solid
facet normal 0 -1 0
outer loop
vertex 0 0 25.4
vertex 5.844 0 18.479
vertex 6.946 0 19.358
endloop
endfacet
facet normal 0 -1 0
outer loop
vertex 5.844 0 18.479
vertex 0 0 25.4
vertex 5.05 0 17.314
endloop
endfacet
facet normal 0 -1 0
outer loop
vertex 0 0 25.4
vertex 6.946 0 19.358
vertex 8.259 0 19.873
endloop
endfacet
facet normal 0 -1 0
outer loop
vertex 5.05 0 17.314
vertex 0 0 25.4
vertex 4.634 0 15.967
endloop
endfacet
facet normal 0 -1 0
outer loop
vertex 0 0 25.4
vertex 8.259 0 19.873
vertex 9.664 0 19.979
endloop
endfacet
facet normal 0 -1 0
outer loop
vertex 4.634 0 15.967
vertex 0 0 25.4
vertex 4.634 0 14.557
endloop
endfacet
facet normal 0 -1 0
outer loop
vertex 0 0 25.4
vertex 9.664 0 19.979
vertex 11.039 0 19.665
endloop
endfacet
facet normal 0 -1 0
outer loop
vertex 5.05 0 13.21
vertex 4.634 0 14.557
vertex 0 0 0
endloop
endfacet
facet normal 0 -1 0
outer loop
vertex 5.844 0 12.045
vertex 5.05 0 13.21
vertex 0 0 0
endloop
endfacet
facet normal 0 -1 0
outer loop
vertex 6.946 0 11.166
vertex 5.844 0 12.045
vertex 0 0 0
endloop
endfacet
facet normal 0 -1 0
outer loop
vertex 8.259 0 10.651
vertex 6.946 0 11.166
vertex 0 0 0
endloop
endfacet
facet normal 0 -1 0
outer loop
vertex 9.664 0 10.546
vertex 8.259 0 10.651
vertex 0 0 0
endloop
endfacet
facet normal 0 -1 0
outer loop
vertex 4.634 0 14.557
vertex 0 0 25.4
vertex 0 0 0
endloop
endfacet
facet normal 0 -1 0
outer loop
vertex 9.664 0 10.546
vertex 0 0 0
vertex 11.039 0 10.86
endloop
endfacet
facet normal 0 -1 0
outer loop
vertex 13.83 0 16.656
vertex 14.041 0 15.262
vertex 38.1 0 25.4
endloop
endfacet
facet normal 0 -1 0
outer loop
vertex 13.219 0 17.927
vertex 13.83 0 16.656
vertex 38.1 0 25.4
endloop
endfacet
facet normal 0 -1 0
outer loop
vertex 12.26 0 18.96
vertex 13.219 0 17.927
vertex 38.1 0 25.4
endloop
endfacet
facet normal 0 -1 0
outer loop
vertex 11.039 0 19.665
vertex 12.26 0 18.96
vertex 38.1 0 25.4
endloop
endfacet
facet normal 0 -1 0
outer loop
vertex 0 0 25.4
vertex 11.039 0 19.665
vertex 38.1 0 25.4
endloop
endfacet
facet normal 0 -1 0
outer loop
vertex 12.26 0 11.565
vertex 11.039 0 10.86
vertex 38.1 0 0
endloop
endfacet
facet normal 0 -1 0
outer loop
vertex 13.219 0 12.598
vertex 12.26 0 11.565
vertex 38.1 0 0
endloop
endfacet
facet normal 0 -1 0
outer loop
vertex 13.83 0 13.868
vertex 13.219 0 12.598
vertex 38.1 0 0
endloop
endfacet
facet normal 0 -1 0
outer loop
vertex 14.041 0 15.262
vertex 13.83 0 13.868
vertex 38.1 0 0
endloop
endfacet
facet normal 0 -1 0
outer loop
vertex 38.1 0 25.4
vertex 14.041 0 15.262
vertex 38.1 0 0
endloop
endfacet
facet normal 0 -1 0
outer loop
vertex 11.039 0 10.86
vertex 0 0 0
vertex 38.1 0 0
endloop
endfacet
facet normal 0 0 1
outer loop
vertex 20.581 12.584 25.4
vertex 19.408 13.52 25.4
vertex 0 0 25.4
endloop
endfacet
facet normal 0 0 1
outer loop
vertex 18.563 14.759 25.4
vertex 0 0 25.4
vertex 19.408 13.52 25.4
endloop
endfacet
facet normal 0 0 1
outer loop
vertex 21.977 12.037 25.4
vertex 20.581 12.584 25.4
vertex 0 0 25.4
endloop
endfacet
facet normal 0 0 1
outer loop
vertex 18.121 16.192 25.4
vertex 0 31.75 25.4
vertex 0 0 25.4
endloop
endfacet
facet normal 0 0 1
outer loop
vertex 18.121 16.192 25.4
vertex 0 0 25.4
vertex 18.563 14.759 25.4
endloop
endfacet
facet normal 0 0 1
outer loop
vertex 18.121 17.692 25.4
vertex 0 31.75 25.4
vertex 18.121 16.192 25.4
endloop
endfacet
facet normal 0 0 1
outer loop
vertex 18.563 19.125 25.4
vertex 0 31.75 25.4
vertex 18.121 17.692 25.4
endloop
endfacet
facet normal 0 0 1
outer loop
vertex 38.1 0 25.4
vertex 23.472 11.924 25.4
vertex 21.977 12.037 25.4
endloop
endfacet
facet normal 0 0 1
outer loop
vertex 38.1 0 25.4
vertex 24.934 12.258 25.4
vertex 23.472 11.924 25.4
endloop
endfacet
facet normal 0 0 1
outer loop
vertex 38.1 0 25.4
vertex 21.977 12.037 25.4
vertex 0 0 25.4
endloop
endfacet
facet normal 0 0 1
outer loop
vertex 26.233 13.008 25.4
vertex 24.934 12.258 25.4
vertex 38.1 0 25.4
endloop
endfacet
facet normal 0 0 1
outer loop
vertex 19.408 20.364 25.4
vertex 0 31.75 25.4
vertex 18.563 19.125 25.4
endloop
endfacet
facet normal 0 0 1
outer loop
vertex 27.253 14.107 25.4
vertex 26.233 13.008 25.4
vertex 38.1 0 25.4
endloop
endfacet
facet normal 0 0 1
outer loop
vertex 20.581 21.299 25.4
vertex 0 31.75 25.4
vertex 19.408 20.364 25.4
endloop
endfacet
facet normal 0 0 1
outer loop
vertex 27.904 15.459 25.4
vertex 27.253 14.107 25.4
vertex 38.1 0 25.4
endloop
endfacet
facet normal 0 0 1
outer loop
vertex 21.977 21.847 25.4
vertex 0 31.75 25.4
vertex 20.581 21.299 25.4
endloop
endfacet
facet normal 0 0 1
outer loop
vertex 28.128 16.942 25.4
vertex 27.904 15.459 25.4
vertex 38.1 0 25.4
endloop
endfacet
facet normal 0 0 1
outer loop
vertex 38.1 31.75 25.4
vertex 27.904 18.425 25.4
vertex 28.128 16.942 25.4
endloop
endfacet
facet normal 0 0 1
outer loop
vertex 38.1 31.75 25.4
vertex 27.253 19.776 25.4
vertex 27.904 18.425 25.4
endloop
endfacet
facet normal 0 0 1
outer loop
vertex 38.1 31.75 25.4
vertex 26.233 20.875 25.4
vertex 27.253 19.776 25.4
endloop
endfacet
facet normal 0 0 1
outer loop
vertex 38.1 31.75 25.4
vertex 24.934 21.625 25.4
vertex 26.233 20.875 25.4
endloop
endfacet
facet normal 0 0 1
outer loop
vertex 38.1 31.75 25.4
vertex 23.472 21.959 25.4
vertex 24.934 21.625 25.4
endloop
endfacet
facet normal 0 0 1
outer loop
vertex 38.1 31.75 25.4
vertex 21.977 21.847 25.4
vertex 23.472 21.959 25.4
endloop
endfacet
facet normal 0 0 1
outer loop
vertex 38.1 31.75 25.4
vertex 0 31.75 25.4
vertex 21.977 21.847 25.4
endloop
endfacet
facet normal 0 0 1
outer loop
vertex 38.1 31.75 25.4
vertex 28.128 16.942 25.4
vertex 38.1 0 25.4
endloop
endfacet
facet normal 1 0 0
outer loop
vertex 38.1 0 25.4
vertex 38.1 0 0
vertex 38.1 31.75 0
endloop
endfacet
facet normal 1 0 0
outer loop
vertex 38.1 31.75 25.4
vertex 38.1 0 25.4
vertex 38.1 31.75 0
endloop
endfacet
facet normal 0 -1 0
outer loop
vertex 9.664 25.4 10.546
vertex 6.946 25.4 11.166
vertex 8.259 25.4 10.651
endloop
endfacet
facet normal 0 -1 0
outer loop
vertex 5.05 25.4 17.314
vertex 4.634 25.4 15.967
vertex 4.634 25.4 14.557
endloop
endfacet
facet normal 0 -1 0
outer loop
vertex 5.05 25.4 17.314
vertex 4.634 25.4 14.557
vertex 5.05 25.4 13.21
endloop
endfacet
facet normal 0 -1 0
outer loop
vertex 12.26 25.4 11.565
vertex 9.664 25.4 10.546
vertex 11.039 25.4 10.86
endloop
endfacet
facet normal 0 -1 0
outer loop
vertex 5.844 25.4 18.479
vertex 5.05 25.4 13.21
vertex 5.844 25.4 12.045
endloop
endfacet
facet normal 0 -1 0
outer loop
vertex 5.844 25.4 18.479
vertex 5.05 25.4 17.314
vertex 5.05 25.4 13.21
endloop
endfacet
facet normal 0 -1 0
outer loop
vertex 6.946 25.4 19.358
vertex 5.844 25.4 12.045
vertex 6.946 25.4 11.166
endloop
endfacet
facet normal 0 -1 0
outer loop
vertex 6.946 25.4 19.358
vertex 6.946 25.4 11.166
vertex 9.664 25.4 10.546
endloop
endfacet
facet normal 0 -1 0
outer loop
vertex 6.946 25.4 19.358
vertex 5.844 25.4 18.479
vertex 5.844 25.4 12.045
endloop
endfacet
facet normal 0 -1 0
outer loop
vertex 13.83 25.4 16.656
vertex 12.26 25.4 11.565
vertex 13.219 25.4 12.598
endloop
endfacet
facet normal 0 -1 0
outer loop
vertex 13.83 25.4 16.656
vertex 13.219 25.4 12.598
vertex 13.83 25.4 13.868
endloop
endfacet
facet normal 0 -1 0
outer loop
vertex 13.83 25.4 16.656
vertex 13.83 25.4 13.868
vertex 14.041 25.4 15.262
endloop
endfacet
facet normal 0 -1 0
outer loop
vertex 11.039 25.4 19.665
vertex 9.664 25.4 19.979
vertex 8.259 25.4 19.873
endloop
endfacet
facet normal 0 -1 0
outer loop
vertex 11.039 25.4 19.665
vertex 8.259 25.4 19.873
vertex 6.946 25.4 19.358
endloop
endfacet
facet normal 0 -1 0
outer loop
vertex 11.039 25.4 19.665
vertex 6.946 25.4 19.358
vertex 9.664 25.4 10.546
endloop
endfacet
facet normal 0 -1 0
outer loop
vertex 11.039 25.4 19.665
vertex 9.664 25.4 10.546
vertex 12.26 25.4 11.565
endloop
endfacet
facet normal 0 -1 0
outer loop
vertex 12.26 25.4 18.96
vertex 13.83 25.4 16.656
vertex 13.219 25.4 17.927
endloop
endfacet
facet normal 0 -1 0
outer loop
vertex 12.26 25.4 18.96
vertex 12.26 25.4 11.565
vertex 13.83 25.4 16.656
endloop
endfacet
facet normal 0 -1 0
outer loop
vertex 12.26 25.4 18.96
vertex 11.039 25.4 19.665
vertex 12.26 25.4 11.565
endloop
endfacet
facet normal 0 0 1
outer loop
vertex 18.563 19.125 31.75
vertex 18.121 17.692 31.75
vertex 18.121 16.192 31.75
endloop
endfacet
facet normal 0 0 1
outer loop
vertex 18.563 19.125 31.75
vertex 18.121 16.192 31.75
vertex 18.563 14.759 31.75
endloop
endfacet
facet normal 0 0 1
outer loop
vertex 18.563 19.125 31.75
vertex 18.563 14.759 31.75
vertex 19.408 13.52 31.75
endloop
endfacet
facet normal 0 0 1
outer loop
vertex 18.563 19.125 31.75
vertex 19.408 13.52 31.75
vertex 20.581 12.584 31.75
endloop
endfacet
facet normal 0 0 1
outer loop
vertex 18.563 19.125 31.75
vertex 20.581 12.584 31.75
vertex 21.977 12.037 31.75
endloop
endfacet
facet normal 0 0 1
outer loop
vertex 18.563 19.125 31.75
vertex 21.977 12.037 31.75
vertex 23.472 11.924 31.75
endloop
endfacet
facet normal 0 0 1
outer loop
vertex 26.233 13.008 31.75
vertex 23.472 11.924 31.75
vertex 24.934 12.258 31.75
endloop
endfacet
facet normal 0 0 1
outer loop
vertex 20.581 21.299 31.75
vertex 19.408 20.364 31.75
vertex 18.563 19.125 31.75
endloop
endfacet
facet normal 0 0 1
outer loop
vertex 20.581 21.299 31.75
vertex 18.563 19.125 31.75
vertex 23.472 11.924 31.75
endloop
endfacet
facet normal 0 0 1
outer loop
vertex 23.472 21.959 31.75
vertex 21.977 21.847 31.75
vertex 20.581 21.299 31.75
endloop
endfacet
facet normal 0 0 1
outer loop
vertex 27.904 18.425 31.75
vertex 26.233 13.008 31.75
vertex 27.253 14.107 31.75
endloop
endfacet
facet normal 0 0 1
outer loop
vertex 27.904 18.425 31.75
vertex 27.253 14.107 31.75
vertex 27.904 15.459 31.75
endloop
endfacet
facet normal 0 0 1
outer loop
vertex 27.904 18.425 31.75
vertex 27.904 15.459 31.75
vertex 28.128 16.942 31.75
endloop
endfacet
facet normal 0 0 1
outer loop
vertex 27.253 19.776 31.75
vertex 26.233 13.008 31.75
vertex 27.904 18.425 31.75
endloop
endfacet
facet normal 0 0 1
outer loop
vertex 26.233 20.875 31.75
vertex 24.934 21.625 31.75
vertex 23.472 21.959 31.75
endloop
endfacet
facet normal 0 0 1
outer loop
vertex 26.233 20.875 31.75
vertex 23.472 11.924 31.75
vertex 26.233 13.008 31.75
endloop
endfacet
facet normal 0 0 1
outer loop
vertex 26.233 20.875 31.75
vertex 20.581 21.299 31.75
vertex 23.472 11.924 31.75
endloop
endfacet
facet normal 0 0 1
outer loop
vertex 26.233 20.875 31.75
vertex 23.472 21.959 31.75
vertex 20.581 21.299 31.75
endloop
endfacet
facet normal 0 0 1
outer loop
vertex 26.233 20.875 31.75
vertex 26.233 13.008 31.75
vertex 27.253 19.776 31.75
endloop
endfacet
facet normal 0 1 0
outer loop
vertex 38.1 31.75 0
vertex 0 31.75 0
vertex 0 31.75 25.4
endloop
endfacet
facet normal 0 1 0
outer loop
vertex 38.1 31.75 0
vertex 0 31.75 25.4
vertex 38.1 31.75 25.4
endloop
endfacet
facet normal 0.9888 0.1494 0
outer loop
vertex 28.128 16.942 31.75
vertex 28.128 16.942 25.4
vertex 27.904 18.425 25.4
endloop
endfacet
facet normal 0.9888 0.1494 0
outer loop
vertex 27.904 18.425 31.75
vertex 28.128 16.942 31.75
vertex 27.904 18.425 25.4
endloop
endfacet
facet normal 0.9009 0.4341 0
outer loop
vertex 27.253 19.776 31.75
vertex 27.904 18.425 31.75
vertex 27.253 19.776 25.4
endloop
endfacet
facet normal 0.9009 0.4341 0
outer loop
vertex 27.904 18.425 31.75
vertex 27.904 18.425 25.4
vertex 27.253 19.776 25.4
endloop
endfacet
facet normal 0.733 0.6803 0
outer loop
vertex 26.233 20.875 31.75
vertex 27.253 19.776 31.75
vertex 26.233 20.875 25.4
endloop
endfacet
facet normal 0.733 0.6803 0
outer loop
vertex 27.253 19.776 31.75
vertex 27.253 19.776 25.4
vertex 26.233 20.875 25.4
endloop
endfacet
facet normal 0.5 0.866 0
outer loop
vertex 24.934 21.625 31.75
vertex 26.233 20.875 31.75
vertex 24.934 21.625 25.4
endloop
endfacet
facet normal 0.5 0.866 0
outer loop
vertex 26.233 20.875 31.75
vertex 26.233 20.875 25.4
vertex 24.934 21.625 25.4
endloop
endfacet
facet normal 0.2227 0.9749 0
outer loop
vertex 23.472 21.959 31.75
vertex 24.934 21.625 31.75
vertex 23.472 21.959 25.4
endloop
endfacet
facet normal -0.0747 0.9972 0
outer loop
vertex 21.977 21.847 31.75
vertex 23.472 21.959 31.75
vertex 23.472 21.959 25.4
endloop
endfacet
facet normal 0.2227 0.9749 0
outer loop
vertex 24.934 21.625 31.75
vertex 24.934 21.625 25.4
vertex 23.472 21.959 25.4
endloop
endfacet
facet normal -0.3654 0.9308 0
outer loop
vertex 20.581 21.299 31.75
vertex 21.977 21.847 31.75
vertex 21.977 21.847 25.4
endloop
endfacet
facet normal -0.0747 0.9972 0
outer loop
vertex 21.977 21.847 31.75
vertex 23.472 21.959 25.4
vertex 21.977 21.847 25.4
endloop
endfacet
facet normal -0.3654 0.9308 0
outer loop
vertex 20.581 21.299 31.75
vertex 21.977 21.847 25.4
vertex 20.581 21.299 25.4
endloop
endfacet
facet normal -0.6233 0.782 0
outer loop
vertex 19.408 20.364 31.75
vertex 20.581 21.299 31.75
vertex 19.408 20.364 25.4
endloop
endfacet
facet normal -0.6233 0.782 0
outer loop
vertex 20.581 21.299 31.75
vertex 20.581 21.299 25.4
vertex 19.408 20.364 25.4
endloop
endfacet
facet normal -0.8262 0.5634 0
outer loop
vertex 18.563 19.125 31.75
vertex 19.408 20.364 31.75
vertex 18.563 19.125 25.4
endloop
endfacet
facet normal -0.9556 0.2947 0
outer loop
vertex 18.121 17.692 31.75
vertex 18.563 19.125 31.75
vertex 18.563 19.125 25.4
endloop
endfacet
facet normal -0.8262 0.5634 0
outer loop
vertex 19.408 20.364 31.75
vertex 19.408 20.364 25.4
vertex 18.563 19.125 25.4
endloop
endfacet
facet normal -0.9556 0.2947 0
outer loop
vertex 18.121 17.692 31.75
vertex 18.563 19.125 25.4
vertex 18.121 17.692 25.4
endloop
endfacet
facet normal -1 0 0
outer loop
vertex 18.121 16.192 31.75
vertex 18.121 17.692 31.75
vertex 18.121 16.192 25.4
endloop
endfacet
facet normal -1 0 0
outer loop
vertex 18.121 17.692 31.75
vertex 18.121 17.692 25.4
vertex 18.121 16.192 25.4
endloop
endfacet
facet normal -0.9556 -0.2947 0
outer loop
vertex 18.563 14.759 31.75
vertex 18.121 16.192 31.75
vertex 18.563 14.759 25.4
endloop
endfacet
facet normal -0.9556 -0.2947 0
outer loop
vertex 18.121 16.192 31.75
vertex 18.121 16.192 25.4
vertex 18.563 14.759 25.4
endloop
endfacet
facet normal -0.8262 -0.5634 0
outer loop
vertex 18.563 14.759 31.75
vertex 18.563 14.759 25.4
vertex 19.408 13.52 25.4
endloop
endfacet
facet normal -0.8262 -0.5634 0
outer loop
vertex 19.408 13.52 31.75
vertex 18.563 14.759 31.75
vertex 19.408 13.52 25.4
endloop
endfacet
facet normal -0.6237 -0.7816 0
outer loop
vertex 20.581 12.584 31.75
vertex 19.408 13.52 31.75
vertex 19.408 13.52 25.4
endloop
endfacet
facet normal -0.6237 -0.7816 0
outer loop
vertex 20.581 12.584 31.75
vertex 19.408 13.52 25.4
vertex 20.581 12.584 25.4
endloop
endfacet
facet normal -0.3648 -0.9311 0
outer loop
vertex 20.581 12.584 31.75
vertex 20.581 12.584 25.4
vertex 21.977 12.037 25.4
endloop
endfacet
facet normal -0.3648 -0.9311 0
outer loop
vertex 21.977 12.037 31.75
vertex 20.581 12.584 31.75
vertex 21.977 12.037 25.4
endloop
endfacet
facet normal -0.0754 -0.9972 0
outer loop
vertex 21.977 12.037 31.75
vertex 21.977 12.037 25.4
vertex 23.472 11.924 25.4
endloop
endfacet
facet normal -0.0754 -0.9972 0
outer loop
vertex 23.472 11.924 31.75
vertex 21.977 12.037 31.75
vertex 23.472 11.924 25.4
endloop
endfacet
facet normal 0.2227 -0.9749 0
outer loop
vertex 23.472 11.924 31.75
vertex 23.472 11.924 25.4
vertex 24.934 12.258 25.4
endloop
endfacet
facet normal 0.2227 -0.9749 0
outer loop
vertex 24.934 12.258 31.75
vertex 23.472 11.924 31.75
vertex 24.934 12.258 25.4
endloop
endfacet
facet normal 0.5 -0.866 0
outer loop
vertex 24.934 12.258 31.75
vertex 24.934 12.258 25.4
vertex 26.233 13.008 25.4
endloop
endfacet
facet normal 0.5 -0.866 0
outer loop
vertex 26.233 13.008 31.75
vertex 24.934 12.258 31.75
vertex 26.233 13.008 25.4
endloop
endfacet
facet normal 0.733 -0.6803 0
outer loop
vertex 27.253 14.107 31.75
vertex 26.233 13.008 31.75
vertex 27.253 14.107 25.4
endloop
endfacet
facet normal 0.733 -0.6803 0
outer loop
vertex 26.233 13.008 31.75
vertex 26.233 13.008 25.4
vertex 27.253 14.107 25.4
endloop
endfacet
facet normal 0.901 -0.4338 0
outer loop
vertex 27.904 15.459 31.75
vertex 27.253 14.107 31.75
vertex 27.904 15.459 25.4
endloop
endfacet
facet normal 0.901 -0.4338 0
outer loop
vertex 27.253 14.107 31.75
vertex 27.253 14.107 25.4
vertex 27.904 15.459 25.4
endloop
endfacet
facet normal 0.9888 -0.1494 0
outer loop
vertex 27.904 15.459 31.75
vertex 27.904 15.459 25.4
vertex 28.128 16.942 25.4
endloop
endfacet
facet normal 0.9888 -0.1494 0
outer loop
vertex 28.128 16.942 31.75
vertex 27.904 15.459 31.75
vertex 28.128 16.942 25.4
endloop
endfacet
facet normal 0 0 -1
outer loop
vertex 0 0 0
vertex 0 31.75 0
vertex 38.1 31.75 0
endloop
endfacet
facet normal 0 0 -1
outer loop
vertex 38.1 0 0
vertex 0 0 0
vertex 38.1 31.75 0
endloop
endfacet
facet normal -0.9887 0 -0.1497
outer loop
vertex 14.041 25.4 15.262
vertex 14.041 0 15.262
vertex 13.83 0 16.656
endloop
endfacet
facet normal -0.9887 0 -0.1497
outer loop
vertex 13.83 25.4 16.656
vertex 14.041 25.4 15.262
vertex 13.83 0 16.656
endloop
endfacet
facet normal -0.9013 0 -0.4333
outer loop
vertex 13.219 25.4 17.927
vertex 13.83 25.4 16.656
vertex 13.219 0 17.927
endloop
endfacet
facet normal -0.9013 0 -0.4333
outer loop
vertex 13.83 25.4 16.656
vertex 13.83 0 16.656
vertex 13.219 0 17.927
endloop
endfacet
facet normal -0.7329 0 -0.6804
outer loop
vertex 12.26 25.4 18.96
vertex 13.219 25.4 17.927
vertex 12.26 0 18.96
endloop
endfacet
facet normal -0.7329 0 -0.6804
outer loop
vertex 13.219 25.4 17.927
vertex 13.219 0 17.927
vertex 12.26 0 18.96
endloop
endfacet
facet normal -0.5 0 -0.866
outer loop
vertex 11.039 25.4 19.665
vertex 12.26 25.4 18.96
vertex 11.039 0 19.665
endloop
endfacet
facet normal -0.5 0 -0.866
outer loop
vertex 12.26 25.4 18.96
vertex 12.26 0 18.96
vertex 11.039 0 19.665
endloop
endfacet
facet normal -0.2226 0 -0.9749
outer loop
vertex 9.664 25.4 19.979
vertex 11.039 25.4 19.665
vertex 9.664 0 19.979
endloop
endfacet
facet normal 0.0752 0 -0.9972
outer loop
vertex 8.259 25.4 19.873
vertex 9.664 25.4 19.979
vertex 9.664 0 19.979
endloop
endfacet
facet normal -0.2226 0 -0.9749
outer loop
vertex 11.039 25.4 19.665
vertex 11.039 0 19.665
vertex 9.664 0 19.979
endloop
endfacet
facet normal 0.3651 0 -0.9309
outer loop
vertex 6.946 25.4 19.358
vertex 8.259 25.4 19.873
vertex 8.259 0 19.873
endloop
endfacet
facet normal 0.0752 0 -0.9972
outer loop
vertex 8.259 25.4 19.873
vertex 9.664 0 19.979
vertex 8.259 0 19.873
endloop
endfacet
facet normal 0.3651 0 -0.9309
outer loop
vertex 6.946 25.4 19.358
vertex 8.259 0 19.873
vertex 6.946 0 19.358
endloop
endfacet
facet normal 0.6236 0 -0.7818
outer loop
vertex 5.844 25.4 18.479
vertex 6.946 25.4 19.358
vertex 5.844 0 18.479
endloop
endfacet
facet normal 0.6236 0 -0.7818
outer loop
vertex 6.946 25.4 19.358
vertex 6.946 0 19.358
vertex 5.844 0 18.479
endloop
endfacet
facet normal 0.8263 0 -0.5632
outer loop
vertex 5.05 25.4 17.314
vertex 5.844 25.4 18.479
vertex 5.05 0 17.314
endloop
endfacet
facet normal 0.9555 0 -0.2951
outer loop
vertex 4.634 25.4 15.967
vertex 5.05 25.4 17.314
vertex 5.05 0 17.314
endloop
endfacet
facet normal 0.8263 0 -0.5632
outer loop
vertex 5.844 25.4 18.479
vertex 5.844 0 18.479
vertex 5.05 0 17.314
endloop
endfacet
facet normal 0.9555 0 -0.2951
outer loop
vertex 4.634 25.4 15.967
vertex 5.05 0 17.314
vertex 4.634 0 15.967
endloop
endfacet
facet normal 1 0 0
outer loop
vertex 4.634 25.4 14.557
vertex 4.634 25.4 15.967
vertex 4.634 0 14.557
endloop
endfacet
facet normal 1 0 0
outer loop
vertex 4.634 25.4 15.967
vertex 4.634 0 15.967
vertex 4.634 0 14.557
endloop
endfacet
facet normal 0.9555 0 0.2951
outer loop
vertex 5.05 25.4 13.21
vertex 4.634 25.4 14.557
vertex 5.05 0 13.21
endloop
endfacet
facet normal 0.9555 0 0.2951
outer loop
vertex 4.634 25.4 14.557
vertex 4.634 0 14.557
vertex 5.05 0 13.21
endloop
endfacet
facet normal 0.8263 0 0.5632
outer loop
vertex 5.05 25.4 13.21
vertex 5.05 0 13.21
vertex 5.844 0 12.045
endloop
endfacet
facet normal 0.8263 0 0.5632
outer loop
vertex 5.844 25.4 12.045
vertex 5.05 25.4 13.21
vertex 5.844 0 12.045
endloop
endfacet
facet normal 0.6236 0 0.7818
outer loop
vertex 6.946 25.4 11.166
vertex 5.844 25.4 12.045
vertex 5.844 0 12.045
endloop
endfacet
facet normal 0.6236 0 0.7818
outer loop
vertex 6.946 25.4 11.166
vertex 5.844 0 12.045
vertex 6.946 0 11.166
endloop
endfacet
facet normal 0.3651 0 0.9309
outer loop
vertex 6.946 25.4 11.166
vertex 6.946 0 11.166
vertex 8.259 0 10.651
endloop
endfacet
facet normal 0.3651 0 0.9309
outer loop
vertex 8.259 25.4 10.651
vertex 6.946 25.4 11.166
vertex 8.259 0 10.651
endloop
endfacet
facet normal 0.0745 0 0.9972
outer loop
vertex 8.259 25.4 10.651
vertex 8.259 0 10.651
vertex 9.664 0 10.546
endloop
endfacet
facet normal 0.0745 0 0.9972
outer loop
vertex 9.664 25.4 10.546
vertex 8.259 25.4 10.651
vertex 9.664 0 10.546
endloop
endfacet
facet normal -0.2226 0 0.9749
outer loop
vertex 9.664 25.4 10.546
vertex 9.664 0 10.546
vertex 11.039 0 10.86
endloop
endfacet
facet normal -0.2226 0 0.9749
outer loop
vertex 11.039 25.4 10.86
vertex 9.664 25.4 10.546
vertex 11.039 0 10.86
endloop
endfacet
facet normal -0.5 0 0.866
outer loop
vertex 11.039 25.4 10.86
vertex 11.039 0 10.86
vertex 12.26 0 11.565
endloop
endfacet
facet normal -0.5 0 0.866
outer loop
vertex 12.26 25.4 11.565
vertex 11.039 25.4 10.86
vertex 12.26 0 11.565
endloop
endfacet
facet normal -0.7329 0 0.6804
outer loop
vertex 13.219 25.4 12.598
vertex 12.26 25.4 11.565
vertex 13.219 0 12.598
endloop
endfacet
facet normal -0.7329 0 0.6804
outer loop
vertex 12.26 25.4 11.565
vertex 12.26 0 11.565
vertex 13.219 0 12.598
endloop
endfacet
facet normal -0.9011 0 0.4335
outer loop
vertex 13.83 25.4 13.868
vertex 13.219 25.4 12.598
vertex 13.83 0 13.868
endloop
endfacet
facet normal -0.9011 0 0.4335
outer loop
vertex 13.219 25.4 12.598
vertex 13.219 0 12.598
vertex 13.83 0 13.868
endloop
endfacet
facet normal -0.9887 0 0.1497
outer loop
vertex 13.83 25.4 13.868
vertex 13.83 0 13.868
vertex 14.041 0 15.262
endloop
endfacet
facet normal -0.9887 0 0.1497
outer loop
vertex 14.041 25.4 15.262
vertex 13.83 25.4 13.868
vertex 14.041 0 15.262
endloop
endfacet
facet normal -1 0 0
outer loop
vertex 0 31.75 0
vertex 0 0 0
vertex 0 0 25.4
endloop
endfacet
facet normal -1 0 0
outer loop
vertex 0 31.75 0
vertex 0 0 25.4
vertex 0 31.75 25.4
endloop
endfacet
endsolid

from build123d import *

# Parameters (mm, degrees)
F0_W     = 38.1
F0_H     = 31.75
F1_DEPTH = 25.4
F2_R     = 4.729521
F3_DEPTH = 25.4
F4_R     = 5.03132
F5_DEPTH = 6.35


with BuildPart() as f1:
    # F0 (on Top) → F1 (new body)
    with BuildSketch(Plane.XY):
        with Locations((19.05, 15.875)):
            Rectangle(F0_W, F0_H)
    extrude(amount=F1_DEPTH)

    # F2 (on Front) → F3 (cut)
    with BuildSketch(Plane.XZ):
        with Locations((9.311019, 15.262362)):
            Circle(F2_R)
    extrude(amount=-F3_DEPTH, mode=Mode.SUBTRACT)

    # F4 (on face) → F5 (join)
    with BuildSketch(Plane.XY.offset(25.4)):
        with Locations((23.096351, 16.941737)):
            Circle(F4_R)
    extrude(amount=F5_DEPTH)


solid = f1.part
